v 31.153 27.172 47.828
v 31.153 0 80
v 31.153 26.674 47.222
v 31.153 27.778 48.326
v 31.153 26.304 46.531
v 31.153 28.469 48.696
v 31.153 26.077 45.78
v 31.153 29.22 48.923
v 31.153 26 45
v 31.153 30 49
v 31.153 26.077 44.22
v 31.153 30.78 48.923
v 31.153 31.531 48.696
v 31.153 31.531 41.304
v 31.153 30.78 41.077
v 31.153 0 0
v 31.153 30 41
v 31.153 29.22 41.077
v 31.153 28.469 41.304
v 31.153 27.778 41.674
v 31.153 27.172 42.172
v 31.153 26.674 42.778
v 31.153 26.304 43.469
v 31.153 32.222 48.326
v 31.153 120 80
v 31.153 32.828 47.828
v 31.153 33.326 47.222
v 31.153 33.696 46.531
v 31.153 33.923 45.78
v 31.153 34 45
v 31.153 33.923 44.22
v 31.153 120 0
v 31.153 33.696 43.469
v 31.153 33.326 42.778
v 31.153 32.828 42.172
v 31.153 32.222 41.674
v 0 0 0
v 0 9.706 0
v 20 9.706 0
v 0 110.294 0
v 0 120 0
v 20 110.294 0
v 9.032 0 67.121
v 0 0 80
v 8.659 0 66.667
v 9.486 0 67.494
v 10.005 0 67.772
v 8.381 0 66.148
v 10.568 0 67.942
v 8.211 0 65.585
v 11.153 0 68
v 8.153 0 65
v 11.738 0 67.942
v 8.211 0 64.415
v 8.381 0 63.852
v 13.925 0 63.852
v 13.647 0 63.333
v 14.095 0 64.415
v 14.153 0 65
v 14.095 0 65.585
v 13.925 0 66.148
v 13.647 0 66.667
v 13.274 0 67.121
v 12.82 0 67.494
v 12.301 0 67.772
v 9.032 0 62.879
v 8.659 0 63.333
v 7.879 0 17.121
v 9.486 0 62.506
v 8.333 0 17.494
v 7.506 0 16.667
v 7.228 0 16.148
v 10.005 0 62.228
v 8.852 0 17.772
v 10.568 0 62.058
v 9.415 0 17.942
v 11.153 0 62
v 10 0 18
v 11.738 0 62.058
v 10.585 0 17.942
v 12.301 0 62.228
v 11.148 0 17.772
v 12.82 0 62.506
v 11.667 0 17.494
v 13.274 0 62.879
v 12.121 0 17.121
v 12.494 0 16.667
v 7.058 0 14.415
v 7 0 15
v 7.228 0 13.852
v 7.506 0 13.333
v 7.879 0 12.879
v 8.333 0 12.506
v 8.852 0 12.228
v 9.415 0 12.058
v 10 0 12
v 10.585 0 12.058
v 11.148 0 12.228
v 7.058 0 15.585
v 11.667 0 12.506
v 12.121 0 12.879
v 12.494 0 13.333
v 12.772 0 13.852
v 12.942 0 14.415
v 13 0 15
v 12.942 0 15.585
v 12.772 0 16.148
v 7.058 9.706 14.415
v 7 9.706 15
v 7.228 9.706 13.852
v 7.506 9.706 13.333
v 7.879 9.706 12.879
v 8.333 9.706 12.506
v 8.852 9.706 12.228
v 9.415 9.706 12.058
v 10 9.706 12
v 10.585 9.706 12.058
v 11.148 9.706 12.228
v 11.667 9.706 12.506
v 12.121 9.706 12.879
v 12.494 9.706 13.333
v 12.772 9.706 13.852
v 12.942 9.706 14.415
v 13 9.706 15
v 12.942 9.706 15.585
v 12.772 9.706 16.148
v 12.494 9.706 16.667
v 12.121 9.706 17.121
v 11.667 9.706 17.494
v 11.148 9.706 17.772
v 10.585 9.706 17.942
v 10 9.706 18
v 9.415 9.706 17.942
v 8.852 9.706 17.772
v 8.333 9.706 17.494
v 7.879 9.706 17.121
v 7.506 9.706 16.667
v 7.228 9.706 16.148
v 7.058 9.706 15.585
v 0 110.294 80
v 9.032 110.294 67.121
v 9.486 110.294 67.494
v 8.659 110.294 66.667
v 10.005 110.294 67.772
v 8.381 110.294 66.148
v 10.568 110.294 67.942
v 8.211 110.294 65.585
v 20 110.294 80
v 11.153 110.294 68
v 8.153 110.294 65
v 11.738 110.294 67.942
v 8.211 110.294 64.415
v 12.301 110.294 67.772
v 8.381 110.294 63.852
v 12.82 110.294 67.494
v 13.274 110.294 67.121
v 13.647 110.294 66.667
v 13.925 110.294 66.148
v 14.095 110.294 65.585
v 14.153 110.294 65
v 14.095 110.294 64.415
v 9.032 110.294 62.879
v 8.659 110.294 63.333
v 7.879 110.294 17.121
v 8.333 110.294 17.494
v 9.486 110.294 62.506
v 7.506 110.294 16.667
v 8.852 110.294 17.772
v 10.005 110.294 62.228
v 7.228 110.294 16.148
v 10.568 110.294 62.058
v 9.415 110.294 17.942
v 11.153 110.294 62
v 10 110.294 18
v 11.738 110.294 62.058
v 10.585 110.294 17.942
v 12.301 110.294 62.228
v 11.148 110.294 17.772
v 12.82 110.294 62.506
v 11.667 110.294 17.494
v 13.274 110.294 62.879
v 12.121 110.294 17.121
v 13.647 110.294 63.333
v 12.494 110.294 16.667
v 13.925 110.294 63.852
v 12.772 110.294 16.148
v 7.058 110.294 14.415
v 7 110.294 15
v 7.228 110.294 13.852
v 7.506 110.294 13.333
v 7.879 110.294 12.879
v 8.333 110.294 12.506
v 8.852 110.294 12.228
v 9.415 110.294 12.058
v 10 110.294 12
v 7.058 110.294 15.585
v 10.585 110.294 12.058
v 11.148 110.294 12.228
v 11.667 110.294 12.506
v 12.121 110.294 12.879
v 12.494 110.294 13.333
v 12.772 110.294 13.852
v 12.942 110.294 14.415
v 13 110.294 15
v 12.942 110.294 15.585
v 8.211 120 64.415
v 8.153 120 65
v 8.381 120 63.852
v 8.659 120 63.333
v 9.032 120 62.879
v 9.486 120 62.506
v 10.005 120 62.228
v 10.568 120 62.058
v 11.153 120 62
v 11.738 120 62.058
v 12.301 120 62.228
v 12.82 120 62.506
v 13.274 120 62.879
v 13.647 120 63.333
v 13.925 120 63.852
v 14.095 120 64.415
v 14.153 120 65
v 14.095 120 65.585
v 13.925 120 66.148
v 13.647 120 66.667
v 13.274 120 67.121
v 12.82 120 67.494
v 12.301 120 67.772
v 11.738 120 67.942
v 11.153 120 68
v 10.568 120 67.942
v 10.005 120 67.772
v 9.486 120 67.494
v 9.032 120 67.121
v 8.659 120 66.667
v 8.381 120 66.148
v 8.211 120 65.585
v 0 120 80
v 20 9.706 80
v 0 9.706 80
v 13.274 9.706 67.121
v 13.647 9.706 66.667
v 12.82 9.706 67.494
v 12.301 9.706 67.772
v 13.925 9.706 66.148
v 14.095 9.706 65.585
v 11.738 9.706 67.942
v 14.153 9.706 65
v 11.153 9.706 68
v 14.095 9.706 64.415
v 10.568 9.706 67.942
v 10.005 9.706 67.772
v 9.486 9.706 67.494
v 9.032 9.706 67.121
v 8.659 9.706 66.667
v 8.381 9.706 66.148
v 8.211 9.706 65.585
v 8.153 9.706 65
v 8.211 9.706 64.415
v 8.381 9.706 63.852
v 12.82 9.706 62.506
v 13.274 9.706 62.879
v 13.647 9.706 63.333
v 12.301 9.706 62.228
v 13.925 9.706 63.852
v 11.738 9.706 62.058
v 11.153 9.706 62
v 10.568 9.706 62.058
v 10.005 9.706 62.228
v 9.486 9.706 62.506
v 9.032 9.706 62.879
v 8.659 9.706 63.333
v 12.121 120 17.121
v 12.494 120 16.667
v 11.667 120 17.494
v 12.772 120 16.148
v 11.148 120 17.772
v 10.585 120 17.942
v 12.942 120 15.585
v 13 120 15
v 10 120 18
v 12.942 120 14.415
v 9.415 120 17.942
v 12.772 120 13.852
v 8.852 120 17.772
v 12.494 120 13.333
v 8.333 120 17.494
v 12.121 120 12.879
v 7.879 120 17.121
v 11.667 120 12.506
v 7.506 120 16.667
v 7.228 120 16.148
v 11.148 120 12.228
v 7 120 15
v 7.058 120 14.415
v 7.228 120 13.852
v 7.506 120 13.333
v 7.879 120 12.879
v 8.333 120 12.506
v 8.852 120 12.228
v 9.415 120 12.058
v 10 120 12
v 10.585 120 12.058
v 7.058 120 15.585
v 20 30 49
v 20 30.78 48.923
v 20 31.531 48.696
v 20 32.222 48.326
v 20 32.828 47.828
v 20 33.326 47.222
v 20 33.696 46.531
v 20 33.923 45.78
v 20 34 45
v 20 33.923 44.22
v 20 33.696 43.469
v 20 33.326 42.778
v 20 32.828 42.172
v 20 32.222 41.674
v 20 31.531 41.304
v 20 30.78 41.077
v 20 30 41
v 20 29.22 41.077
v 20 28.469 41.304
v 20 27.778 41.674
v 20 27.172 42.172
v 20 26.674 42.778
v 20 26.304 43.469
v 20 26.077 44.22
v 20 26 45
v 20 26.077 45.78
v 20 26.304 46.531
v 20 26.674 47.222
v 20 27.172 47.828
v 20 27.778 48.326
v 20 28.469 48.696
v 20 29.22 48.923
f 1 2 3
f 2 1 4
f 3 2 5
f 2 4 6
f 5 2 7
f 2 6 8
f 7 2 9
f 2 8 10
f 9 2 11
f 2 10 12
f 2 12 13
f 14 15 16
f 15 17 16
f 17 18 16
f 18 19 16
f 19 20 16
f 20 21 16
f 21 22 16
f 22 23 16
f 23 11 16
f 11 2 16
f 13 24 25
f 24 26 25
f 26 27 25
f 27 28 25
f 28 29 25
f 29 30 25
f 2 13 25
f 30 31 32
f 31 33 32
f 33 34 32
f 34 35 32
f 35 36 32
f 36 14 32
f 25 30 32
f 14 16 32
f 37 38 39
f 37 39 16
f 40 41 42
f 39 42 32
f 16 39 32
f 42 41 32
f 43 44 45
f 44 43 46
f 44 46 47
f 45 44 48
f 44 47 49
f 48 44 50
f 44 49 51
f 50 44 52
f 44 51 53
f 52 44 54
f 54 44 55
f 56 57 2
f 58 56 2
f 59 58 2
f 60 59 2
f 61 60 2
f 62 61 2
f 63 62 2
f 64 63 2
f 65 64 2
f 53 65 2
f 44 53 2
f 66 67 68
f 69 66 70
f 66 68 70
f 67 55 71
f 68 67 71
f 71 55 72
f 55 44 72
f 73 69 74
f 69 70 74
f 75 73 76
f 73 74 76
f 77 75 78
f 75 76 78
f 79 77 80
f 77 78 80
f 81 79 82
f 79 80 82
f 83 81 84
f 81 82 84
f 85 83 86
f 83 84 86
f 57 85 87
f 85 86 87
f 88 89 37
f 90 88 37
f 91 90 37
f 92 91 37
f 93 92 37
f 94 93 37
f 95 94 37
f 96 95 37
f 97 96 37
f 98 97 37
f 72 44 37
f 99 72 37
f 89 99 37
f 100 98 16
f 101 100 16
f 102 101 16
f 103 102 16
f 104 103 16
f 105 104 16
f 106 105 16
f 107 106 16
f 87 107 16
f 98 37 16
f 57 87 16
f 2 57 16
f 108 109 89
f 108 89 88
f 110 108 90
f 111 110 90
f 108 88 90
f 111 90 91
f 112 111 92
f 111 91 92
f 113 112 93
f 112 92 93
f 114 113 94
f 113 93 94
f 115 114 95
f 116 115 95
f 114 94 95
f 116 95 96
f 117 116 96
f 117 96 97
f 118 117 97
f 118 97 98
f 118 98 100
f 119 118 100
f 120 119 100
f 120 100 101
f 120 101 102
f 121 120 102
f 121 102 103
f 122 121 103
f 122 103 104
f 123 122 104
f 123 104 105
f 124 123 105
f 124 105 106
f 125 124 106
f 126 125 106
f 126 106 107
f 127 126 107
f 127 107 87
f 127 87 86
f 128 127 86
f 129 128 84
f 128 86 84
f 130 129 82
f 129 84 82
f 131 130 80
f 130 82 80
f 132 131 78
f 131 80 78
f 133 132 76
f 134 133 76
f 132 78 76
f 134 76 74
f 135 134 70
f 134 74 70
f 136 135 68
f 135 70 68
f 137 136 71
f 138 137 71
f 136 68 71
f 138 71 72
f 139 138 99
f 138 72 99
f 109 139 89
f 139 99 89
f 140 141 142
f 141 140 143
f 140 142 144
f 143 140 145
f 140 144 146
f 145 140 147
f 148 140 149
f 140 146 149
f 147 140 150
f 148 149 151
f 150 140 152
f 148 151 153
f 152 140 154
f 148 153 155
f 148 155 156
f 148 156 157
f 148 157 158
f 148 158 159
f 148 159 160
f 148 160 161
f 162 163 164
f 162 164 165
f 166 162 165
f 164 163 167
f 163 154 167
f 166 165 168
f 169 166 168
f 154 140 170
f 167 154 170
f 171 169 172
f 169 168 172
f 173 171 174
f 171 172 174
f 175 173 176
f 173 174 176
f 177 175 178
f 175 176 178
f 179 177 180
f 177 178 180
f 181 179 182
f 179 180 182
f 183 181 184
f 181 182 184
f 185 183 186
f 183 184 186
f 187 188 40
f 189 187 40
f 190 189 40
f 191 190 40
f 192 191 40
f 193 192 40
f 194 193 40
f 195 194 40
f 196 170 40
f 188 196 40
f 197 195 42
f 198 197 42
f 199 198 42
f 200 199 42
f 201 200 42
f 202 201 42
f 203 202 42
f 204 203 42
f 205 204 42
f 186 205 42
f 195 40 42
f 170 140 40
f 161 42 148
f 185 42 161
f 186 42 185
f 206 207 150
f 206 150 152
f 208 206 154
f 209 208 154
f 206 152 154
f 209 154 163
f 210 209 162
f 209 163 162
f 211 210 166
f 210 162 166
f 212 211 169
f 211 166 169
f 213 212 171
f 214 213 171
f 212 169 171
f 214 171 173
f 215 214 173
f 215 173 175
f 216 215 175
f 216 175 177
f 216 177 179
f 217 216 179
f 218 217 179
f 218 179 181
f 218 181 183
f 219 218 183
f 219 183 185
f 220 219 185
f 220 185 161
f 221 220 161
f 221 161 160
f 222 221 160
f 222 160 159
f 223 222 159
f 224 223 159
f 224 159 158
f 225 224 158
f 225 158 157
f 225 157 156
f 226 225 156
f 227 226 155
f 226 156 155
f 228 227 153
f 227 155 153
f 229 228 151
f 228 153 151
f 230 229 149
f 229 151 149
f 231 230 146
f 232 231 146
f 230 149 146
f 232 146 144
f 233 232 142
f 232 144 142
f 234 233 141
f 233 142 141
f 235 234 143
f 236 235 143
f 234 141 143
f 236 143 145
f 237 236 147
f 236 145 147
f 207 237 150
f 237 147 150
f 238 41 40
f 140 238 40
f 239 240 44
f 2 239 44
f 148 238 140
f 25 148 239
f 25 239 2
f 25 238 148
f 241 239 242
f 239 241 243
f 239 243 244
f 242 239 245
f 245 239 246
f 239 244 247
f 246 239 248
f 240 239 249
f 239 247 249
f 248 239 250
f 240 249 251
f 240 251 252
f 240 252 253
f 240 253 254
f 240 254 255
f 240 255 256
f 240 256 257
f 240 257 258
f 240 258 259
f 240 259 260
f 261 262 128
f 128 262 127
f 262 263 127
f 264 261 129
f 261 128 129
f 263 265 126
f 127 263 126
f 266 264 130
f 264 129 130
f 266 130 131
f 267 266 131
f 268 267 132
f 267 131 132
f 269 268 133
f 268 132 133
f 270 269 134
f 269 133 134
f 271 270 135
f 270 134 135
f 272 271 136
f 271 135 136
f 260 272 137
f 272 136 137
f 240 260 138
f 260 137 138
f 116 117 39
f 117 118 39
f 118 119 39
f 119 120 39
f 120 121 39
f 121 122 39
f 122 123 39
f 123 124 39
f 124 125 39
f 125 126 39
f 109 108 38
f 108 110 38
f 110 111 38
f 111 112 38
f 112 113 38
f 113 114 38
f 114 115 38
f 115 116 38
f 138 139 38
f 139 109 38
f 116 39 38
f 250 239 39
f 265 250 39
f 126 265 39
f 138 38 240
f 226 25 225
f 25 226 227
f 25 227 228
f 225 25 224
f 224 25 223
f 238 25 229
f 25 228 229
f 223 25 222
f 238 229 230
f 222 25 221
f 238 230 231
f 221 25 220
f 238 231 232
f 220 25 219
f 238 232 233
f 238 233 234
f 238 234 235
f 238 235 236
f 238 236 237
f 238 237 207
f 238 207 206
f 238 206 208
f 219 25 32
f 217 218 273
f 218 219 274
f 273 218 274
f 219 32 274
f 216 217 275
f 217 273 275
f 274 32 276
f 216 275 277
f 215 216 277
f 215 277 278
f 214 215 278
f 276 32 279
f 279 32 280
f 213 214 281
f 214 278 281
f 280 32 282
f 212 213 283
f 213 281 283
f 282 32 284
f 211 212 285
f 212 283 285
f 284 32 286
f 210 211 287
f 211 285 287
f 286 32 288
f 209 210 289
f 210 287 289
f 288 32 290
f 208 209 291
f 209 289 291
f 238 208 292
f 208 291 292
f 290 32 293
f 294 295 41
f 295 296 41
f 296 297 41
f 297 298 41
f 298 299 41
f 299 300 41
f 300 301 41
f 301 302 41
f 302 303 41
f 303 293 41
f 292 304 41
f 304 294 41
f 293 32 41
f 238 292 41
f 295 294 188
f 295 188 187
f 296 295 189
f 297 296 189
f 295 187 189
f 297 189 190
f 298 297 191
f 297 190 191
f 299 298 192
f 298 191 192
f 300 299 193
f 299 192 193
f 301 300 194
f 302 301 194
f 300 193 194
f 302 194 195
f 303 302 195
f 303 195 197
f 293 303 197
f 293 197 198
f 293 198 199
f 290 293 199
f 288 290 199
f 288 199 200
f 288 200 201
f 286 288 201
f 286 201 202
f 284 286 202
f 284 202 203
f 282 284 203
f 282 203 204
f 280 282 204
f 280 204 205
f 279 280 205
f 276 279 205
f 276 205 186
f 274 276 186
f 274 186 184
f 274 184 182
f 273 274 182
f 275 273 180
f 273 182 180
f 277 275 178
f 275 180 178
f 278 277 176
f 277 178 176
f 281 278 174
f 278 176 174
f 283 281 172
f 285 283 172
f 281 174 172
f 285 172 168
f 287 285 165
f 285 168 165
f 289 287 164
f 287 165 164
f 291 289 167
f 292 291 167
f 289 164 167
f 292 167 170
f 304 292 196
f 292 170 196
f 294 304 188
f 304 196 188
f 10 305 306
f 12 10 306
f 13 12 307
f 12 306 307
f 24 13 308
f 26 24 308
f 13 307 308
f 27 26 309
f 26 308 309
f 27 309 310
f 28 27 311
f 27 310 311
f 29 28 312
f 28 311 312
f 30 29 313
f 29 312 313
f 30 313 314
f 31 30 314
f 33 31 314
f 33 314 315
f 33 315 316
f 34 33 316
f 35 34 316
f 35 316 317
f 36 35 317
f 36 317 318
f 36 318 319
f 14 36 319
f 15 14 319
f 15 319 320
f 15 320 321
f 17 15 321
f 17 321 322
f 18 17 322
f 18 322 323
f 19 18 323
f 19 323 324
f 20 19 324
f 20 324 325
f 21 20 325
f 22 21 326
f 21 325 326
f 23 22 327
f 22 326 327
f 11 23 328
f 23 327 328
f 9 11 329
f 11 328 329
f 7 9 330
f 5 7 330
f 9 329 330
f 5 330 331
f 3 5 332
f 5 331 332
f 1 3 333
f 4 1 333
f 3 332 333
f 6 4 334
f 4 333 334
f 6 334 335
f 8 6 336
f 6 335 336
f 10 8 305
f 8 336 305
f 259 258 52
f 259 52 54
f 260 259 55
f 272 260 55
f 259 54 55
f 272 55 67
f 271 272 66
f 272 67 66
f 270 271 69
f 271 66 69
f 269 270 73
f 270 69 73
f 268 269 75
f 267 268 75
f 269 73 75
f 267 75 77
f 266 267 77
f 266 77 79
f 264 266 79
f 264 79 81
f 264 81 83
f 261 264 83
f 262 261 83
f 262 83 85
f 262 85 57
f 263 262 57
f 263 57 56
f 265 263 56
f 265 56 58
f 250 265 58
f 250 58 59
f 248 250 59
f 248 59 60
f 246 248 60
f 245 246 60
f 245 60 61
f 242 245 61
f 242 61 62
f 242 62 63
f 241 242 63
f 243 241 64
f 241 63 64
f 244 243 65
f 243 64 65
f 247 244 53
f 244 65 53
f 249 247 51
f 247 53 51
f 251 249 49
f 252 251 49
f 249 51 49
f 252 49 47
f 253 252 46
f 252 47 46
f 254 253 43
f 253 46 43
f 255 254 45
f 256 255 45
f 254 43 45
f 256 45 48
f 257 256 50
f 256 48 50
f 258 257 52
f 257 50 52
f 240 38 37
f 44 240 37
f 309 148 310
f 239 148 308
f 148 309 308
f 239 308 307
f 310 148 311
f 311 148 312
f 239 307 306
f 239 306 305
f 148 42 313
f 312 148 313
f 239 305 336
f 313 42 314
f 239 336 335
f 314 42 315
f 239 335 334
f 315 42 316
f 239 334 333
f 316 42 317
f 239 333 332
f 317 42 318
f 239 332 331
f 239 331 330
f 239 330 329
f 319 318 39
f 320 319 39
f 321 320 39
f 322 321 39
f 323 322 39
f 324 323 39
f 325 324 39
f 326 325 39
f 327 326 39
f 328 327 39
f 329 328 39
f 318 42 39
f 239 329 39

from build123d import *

# Parameters (mm, degrees)
BOSS_EXTRUDE1_DEPTH      = 80
F_6_0_6_DIAMETER_HOLE1_D = 6
F_8_0_8_DIAMETER_HOLE1_D = 8
F_6_0_6_DIAMETER_HOLE2_D = 6


with BuildPart() as part:
    # Sketch2 → Boss-Extrude1 (new body)
    with BuildSketch(Plane.XY):
        Polygon((0, 0), (31.153008197, 0), (31.153008197, 120), (0, 120), (0, 110.293748295), (20, 110.293748295), (20, 9.706251705), (0, 9.706251705), align=None)
    extrude(amount=BOSS_EXTRUDE1_DEPTH)

    # Ø6.0 (6) Diameter Hole1 (through all)
    with Locations(Plane(origin=(0, 120, 0), x_dir=(1, 0, 0), z_dir=(0, 1, 0))):
        with Locations((10, -15)):
            Hole(F_6_0_6_DIAMETER_HOLE1_D / 2)

    # Ø8.0 (8) Diameter Hole1 (through all)
    with Locations(Plane(origin=(31.153008197, 0, 0), x_dir=(0, 0, -1), z_dir=(1, 0, 0))):
        with Locations((-45, 30)):
            Hole(F_8_0_8_DIAMETER_HOLE1_D / 2)

    # Ø6.0 (6) Diameter Hole2 (through all)
    with Locations(Plane(origin=(0, 120, 0), x_dir=(1, 0, 0), z_dir=(0, 1, 0))):
        with Locations((11.153008197, -65)):
            Hole(F_6_0_6_DIAMETER_HOLE2_D / 2)


solid = part.part
